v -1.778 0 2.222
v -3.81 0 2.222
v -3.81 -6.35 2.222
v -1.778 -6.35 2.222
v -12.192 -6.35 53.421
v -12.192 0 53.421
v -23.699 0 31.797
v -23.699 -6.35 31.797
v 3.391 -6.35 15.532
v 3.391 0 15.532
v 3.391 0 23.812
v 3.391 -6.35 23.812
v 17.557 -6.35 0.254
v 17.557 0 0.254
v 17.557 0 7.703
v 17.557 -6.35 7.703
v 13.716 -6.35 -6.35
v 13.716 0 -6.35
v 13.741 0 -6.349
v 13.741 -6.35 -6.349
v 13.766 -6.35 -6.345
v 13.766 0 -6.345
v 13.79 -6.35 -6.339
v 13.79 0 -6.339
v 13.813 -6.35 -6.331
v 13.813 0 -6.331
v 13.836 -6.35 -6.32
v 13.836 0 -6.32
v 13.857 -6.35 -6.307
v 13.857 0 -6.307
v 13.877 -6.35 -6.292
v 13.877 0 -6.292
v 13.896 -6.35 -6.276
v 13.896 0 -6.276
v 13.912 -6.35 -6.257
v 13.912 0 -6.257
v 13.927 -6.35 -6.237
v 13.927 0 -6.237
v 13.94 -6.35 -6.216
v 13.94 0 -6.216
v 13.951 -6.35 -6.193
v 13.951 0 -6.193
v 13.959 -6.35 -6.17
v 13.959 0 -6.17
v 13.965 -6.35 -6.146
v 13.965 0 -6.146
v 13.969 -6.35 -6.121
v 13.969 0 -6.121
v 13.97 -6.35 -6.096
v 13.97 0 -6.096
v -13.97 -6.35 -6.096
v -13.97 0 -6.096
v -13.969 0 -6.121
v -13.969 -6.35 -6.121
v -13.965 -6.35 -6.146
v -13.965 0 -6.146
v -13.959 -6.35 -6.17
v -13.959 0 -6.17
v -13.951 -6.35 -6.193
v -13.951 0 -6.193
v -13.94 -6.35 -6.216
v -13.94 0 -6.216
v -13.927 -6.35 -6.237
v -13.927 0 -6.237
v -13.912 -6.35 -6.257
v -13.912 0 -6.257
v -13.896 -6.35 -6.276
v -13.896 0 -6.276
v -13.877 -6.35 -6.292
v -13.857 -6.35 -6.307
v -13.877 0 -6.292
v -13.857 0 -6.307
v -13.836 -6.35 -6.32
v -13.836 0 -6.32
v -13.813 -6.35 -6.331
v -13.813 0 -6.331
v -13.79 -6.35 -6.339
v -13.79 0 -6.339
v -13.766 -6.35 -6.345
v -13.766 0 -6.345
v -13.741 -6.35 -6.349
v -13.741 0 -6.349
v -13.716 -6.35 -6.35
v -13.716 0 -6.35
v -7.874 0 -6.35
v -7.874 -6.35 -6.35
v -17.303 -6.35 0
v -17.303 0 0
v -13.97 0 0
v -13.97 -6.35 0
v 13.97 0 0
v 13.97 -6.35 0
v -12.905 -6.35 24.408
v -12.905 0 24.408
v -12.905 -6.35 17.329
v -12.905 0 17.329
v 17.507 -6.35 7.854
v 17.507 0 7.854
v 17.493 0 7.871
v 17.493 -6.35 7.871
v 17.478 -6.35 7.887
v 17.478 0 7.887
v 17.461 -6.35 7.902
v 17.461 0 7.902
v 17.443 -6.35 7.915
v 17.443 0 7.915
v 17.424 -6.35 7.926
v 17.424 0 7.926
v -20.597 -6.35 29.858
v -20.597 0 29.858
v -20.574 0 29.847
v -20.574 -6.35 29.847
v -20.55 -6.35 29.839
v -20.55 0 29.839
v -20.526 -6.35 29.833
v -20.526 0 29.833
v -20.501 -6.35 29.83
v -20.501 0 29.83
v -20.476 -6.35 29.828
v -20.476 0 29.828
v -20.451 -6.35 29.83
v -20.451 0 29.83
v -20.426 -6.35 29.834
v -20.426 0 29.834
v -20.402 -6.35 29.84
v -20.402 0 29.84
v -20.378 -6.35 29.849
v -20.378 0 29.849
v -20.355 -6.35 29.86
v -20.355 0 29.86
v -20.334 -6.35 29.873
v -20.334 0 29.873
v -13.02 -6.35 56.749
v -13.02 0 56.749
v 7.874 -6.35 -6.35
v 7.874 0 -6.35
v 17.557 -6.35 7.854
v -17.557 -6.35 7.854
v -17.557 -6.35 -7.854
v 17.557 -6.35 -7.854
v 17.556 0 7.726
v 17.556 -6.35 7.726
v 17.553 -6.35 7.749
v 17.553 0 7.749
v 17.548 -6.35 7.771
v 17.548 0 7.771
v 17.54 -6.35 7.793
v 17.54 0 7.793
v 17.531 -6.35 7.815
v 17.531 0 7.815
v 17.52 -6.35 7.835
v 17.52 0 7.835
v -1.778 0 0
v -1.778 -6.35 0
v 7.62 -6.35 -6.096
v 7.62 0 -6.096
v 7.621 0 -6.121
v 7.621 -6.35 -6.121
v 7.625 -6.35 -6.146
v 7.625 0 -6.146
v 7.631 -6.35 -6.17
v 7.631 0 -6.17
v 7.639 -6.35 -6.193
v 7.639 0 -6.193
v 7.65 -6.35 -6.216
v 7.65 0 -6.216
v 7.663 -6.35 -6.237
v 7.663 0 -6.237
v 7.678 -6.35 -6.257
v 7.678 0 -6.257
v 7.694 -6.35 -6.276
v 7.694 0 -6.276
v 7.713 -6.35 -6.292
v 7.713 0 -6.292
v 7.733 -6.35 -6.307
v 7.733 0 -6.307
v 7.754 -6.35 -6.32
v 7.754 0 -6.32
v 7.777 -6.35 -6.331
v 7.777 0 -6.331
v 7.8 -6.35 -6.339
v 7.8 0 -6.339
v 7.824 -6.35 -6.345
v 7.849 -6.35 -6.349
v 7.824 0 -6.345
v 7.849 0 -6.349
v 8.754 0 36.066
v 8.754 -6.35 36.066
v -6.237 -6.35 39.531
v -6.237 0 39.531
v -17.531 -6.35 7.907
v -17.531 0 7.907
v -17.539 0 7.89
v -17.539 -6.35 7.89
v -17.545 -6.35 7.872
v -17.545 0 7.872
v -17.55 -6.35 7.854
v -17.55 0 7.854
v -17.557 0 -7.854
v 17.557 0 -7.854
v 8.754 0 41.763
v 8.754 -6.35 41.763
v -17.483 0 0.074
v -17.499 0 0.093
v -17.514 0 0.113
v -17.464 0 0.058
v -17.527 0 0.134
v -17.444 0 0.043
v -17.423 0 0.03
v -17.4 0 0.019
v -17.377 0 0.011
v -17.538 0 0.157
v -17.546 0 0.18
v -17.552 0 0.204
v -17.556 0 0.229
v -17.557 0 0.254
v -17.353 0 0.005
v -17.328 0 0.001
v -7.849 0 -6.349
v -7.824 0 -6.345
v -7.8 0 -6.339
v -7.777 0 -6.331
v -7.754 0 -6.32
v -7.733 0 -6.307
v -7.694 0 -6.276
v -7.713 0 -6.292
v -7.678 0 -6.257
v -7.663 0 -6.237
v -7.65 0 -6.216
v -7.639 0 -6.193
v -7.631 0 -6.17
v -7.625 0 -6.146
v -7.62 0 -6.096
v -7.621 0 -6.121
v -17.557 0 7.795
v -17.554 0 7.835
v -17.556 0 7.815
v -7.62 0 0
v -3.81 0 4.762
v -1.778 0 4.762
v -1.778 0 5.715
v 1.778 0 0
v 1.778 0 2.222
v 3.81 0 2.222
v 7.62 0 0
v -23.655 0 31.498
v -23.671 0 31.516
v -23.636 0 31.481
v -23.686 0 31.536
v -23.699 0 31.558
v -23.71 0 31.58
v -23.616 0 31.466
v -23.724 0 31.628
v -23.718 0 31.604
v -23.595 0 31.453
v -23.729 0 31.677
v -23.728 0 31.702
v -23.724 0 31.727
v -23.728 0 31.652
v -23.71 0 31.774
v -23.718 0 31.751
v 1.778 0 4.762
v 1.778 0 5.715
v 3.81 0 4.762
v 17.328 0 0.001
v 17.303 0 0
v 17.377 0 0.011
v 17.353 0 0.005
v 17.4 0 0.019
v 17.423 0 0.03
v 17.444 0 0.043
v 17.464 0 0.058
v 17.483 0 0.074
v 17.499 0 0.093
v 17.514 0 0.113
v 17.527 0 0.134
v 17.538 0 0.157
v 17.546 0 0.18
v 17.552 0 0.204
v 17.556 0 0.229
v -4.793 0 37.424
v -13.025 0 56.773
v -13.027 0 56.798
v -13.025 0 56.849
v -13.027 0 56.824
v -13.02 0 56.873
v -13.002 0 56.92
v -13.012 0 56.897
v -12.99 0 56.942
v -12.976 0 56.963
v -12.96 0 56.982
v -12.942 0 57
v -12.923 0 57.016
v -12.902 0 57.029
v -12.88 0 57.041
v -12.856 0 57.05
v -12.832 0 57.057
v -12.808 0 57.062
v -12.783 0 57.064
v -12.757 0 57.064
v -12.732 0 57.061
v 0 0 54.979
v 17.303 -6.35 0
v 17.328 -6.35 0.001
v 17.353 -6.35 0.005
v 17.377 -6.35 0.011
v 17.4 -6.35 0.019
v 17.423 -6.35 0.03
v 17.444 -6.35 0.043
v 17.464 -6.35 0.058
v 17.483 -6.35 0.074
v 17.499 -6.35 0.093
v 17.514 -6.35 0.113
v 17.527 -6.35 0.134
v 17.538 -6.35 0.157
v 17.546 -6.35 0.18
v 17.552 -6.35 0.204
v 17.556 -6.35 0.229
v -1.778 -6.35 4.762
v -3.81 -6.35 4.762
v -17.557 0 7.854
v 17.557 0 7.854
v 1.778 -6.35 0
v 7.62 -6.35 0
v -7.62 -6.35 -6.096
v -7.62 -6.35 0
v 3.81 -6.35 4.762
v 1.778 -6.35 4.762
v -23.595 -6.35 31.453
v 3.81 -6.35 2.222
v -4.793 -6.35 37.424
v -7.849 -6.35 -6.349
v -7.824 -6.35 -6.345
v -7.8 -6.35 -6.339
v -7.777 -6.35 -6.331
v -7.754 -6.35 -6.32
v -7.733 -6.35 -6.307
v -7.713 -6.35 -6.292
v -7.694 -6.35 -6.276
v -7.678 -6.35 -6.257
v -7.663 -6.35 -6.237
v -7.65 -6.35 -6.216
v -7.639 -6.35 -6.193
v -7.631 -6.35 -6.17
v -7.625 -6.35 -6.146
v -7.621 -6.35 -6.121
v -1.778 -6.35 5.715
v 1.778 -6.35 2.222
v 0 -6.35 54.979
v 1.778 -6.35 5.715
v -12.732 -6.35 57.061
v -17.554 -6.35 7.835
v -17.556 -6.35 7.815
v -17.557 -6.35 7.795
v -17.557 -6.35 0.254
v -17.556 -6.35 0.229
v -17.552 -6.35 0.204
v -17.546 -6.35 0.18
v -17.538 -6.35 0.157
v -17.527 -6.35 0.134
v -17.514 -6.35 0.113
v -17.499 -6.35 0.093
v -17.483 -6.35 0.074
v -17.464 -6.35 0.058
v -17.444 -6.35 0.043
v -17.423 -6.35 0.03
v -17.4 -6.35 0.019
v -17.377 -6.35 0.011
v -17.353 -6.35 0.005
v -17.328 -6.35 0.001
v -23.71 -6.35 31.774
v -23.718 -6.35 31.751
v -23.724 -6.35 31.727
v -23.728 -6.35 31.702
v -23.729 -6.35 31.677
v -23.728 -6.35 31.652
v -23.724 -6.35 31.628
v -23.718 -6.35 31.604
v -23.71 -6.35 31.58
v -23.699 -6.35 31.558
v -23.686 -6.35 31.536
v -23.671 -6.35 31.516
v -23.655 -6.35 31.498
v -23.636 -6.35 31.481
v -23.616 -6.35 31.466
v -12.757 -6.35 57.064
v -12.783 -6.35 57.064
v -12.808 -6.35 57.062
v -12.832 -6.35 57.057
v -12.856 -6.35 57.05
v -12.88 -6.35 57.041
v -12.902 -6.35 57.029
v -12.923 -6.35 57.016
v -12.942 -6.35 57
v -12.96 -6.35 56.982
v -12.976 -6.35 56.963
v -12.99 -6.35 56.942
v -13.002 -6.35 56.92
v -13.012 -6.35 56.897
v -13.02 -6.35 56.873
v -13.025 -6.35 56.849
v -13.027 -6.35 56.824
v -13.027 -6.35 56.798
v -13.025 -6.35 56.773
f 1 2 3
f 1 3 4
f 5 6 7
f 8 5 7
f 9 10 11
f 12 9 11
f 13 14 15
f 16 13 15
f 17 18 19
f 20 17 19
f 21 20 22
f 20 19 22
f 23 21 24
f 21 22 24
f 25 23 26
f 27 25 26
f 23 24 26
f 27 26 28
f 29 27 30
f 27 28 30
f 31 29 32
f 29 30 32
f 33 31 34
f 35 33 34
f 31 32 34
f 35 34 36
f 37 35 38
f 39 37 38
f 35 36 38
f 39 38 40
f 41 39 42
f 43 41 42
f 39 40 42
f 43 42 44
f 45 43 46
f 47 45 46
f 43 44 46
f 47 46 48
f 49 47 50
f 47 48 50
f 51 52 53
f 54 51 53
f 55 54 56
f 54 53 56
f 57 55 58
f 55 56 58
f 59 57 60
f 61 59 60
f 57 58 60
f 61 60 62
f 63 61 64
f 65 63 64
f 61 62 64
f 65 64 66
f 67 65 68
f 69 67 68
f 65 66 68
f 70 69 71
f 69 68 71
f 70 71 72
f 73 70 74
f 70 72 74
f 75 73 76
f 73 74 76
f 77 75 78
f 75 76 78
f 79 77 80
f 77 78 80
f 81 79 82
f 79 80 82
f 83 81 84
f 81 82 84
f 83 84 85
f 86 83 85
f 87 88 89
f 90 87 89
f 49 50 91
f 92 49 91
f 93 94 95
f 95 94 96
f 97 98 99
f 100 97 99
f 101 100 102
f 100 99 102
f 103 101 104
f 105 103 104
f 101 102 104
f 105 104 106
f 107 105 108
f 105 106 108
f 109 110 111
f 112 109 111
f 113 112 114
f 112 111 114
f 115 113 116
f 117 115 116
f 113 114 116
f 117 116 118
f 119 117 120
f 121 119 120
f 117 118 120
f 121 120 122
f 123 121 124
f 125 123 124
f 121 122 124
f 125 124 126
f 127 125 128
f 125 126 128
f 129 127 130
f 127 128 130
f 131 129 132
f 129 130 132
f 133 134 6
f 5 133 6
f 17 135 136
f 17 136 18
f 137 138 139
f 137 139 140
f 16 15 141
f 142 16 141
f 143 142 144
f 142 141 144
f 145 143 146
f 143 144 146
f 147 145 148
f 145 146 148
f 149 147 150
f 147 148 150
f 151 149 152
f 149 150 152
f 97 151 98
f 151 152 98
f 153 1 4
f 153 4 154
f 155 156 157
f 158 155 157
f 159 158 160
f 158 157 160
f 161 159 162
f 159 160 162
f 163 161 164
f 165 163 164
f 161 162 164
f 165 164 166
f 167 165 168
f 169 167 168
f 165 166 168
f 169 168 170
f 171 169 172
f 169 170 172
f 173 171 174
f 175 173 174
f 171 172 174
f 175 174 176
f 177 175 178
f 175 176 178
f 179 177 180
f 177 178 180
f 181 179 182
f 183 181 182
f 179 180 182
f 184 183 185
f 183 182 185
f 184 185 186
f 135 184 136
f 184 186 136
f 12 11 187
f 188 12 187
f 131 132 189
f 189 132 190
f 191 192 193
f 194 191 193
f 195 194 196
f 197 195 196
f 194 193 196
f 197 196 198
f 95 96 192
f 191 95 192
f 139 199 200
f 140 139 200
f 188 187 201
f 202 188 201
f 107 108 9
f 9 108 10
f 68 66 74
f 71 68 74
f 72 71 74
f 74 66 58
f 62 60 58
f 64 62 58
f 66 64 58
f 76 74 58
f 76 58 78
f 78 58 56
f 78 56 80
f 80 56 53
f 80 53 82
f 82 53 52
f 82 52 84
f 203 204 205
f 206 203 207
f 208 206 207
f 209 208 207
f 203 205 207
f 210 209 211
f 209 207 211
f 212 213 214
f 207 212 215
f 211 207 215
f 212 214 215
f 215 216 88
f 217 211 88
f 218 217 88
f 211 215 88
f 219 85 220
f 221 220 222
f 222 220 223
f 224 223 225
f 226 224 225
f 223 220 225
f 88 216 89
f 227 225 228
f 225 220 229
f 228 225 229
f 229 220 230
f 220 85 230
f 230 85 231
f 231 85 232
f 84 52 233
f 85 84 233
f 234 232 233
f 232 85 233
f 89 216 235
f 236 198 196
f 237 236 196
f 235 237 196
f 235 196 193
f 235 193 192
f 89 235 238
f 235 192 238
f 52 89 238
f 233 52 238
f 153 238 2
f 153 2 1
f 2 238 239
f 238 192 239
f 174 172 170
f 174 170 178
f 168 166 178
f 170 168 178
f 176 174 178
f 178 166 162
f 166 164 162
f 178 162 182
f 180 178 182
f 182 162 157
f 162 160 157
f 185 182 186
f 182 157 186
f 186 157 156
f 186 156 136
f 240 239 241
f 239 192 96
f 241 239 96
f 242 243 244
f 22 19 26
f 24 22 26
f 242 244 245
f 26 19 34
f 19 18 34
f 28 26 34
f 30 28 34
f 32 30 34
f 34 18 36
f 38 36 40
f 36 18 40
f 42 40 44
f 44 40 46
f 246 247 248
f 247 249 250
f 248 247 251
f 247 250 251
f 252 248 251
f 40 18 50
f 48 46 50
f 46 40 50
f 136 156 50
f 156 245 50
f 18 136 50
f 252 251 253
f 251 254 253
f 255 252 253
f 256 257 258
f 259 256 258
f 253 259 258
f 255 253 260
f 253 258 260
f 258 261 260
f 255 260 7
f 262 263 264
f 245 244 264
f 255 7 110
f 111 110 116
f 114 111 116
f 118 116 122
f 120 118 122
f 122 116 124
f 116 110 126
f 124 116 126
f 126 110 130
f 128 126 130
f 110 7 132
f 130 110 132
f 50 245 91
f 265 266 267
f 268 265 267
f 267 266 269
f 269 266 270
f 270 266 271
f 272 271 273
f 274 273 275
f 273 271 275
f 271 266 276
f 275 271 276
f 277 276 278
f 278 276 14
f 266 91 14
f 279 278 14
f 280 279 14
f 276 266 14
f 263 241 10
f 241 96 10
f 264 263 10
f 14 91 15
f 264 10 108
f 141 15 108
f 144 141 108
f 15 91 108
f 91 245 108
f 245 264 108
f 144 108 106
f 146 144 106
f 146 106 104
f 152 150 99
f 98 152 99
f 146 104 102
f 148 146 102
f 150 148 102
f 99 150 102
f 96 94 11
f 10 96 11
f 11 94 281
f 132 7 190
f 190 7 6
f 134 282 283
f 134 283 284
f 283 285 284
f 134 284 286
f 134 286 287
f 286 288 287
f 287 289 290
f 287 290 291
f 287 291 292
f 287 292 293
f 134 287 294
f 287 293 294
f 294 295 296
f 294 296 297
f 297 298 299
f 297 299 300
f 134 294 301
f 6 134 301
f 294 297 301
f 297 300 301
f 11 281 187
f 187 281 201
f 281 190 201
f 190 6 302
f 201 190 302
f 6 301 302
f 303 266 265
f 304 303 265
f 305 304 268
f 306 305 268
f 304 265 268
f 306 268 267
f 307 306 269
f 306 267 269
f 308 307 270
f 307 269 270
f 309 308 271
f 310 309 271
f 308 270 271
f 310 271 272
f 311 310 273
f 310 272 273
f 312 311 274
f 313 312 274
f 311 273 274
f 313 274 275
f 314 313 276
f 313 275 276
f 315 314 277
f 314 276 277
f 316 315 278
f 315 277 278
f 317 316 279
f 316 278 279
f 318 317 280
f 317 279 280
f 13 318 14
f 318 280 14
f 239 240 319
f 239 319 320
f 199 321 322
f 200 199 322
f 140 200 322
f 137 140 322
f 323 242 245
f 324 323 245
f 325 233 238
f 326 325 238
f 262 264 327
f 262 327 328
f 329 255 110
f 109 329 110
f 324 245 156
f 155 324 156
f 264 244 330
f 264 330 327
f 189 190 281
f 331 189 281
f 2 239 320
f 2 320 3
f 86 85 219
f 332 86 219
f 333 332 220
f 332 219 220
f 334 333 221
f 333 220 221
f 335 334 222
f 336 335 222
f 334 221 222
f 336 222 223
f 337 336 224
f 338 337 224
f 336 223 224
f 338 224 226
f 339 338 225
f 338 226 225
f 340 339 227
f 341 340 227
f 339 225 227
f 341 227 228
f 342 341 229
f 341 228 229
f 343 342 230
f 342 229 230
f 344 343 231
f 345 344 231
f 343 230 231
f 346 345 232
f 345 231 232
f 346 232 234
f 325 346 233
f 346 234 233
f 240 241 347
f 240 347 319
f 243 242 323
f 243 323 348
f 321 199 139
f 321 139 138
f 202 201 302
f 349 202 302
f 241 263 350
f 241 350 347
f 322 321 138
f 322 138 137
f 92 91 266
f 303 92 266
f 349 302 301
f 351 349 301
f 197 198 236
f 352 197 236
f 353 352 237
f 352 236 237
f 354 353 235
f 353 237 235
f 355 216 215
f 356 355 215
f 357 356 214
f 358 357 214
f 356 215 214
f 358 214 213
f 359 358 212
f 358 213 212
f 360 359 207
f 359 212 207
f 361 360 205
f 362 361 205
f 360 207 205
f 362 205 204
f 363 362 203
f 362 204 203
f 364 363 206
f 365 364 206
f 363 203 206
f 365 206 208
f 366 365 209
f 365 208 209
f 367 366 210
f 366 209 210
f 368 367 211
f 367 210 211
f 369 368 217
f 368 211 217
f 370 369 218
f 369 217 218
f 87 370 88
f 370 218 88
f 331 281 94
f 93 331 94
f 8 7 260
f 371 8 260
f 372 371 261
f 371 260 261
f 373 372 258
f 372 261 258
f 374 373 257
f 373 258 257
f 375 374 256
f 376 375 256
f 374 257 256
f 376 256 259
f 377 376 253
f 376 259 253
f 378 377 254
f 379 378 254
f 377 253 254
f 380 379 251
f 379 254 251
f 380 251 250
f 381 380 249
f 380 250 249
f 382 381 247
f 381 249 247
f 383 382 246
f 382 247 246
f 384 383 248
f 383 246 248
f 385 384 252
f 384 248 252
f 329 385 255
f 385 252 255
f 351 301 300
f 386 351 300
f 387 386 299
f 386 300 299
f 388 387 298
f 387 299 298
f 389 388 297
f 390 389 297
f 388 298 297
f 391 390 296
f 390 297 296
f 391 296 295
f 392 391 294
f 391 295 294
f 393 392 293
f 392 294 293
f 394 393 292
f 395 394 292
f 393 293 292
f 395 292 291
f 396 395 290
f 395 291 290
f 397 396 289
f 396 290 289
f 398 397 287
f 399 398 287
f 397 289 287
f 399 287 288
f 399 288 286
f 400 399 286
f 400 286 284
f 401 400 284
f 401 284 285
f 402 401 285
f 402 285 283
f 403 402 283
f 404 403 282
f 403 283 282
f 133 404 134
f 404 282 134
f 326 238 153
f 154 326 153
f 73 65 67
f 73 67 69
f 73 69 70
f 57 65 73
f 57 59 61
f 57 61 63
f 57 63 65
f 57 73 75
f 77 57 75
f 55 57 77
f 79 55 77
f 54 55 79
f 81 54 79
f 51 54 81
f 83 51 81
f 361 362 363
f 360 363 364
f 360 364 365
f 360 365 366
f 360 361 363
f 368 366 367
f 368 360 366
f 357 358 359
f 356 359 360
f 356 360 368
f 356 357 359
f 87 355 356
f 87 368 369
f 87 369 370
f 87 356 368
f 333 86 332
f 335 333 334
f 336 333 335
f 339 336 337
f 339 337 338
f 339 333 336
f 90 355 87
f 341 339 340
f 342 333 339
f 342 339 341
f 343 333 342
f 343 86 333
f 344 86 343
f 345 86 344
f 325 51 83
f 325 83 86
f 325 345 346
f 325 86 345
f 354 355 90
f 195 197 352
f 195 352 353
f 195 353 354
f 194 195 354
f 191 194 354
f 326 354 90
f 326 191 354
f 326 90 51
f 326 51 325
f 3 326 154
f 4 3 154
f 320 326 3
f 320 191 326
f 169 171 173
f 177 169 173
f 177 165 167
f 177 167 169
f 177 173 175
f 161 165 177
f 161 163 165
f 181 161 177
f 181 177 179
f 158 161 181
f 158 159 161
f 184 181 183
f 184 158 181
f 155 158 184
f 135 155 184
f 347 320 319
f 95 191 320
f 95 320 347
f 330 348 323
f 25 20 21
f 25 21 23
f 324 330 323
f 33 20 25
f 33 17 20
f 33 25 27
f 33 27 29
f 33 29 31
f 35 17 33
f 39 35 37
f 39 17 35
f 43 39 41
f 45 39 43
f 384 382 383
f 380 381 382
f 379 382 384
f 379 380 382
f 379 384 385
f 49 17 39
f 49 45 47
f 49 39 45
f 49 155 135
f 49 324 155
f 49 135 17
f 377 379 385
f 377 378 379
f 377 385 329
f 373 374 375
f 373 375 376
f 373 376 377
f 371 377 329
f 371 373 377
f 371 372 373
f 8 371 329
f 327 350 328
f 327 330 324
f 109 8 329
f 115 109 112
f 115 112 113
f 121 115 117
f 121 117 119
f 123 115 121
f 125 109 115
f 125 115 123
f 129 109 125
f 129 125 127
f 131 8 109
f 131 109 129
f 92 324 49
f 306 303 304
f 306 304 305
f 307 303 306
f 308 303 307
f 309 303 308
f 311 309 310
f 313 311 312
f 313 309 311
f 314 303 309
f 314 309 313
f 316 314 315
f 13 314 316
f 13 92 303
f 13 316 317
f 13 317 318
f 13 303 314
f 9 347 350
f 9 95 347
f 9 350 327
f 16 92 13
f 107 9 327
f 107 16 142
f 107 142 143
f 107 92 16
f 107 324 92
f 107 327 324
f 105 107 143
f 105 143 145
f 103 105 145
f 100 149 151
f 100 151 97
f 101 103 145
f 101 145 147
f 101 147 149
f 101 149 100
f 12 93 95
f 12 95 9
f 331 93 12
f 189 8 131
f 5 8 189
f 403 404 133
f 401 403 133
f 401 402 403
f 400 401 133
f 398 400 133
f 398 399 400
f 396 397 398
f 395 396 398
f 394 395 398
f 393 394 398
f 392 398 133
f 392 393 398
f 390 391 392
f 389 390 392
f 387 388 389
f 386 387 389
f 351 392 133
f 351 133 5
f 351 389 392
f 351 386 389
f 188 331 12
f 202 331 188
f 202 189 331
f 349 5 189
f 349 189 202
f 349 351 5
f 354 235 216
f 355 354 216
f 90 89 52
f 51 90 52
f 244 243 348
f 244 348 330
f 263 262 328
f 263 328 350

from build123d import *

# Parameters (mm, degrees)
F0_W     = 35.1139307306
F0_H     = 15.7079994678
F1_DEPTH = 6.35
F3_DEPTH = 6.35
F5_DEPTH = 25.4


with BuildPart() as f1:
    # F0 (on Front) → F1 (new body)
    with BuildSketch(Plane.XZ):
        Rectangle(F0_W, F0_H)
    extrude(amount=F1_DEPTH)


with BuildPart() as f3:
    # F2 (on face) → F3 (new body)
    with BuildSketch(Plane.XZ):
        with BuildLine():
            Line((-12.9048367962, 17.3293557018), (-17.5309673203, 7.9069519959))
            ThreePointArc((-17.5309673203, 7.9069519959), (-17.5419648563, 7.8810051625), (-17.5500203382, 7.8539997339))
            Line((-17.5500203382, 7.8539997339), (17.5070266734, 7.8539997339))
            ThreePointArc((17.5070266734, 7.8539997339), (17.4694564643, 7.8945796529), (17.4239940816, 7.9260665103))
            Line((17.4239940816, 7.9260665103), (3.3905450255, 15.5318096953))
            Line((3.3905450255, 15.5318096953), (3.3905450255, 23.8119002209))
            Line((3.3905450255, 23.8119002209), (8.7542133406, 36.0661039488))
            Line((8.7542133406, 36.0661039488), (8.7542133406, 41.7630597949))
            Line((8.7542133406, 41.7630597949), (0, 54.9788549542))
            Line((0, 54.9788549542), (-12.7324874569, 57.0608443233))
            ThreePointArc((-12.7324874569, 57.0608443233), (-12.9602708202, 56.9822894828), (-13.0199633728, 56.7488522906))
            Line((-13.0199633728, 56.7488522906), (-12.1920456474, 53.4209511994))
            Line((-12.1920456474, 53.4209511994), (-23.6994531811, 31.79702684))
            ThreePointArc((-23.6994531811, 31.79702684), (-23.7181539978, 31.6035252192), (-23.5945511638, 31.4534754366))
            Line((-23.5945511638, 31.4534754366), (-20.5967939678, 29.858186202))
            ThreePointArc((-20.5967939678, 29.858186202), (-20.4632994801, 29.8288084627), (-20.333908564, 29.8728745571))
            Line((-20.333908564, 29.8728745571), (-6.2368744391, 39.5311551932))
            Line((-6.2368744391, 39.5311551932), (-4.7932239249, 37.4240316451))
            Line((-4.7932239249, 37.4240316451), (-12.9048367962, 24.4077248131))
            Line((-12.9048367962, 24.4077248131), (-12.9048367962, 17.3293557018))
        make_face()
        with BuildLine():
            Line((17.5070266734, 7.8539997339), (-17.5500203382, 7.8539997339))
            ThreePointArc((-17.5500203382, 7.8539997339), (-17.5552231334, 7.8247083574), (-17.5569653653, 7.795009562))
            Line((-17.5569653653, 7.795009562), (-17.5569653653, 0.254))
            ThreePointArc((-17.5569653653, 0.254), (-17.4825704877, 0.0743948776), (-17.3029653653, 0))
            Line((-17.3029653653, 0), (-13.97, 0))
            Line((-13.97, 0), (-13.97, -6.096))
            ThreePointArc((-13.97, -6.096), (-13.8956051224, -6.2756051224), (-13.716, -6.35))
            Line((-13.716, -6.35), (-7.874, -6.35))
            ThreePointArc((-7.874, -6.35), (-7.6943948776, -6.2756051224), (-7.62, -6.096))
            Line((-7.62, -6.096), (-7.62, 0))
            Line((-7.62, 0), (7.62, 0))
            Line((7.62, 0), (7.62, -6.096))
            ThreePointArc((7.62, -6.096), (7.6943948776, -6.2756051224), (7.874, -6.35))
            Line((7.874, -6.35), (13.716, -6.35))
            ThreePointArc((13.716, -6.35), (13.8956051224, -6.2756051224), (13.97, -6.096))
            Line((13.97, -6.096), (13.97, 0))
            Line((13.97, 0), (17.3029653653, 0))
            ThreePointArc((17.3029653653, 0), (17.4825704877, 0.0743948776), (17.5569653653, 0.254))
            Line((17.5569653653, 0.254), (17.5569653653, 7.702754957))
            ThreePointArc((17.5569653653, 7.702754957), (17.5441577908, 7.7823929748), (17.5070266734, 7.8539997339))
        make_face()
    extrude(amount=F3_DEPTH)

    # F4 (on Front) → F5 (cut)
    with BuildSketch(Plane.XZ):
        Polygon((1.778, 5.715), (-1.778, 5.715), (-1.778, 4.7625), (-3.81, 4.7625), (-3.81, 2.2225), (-1.778, 2.2225), (-1.778, 0), (1.778, 0), (1.778, 2.2225), (3.81, 2.2225), (3.81, 4.7625), (1.778, 4.7625), align=None)
    extrude(amount=F5_DEPTH, mode=Mode.SUBTRACT)


solid = Compound([f1.part, f3.part])
